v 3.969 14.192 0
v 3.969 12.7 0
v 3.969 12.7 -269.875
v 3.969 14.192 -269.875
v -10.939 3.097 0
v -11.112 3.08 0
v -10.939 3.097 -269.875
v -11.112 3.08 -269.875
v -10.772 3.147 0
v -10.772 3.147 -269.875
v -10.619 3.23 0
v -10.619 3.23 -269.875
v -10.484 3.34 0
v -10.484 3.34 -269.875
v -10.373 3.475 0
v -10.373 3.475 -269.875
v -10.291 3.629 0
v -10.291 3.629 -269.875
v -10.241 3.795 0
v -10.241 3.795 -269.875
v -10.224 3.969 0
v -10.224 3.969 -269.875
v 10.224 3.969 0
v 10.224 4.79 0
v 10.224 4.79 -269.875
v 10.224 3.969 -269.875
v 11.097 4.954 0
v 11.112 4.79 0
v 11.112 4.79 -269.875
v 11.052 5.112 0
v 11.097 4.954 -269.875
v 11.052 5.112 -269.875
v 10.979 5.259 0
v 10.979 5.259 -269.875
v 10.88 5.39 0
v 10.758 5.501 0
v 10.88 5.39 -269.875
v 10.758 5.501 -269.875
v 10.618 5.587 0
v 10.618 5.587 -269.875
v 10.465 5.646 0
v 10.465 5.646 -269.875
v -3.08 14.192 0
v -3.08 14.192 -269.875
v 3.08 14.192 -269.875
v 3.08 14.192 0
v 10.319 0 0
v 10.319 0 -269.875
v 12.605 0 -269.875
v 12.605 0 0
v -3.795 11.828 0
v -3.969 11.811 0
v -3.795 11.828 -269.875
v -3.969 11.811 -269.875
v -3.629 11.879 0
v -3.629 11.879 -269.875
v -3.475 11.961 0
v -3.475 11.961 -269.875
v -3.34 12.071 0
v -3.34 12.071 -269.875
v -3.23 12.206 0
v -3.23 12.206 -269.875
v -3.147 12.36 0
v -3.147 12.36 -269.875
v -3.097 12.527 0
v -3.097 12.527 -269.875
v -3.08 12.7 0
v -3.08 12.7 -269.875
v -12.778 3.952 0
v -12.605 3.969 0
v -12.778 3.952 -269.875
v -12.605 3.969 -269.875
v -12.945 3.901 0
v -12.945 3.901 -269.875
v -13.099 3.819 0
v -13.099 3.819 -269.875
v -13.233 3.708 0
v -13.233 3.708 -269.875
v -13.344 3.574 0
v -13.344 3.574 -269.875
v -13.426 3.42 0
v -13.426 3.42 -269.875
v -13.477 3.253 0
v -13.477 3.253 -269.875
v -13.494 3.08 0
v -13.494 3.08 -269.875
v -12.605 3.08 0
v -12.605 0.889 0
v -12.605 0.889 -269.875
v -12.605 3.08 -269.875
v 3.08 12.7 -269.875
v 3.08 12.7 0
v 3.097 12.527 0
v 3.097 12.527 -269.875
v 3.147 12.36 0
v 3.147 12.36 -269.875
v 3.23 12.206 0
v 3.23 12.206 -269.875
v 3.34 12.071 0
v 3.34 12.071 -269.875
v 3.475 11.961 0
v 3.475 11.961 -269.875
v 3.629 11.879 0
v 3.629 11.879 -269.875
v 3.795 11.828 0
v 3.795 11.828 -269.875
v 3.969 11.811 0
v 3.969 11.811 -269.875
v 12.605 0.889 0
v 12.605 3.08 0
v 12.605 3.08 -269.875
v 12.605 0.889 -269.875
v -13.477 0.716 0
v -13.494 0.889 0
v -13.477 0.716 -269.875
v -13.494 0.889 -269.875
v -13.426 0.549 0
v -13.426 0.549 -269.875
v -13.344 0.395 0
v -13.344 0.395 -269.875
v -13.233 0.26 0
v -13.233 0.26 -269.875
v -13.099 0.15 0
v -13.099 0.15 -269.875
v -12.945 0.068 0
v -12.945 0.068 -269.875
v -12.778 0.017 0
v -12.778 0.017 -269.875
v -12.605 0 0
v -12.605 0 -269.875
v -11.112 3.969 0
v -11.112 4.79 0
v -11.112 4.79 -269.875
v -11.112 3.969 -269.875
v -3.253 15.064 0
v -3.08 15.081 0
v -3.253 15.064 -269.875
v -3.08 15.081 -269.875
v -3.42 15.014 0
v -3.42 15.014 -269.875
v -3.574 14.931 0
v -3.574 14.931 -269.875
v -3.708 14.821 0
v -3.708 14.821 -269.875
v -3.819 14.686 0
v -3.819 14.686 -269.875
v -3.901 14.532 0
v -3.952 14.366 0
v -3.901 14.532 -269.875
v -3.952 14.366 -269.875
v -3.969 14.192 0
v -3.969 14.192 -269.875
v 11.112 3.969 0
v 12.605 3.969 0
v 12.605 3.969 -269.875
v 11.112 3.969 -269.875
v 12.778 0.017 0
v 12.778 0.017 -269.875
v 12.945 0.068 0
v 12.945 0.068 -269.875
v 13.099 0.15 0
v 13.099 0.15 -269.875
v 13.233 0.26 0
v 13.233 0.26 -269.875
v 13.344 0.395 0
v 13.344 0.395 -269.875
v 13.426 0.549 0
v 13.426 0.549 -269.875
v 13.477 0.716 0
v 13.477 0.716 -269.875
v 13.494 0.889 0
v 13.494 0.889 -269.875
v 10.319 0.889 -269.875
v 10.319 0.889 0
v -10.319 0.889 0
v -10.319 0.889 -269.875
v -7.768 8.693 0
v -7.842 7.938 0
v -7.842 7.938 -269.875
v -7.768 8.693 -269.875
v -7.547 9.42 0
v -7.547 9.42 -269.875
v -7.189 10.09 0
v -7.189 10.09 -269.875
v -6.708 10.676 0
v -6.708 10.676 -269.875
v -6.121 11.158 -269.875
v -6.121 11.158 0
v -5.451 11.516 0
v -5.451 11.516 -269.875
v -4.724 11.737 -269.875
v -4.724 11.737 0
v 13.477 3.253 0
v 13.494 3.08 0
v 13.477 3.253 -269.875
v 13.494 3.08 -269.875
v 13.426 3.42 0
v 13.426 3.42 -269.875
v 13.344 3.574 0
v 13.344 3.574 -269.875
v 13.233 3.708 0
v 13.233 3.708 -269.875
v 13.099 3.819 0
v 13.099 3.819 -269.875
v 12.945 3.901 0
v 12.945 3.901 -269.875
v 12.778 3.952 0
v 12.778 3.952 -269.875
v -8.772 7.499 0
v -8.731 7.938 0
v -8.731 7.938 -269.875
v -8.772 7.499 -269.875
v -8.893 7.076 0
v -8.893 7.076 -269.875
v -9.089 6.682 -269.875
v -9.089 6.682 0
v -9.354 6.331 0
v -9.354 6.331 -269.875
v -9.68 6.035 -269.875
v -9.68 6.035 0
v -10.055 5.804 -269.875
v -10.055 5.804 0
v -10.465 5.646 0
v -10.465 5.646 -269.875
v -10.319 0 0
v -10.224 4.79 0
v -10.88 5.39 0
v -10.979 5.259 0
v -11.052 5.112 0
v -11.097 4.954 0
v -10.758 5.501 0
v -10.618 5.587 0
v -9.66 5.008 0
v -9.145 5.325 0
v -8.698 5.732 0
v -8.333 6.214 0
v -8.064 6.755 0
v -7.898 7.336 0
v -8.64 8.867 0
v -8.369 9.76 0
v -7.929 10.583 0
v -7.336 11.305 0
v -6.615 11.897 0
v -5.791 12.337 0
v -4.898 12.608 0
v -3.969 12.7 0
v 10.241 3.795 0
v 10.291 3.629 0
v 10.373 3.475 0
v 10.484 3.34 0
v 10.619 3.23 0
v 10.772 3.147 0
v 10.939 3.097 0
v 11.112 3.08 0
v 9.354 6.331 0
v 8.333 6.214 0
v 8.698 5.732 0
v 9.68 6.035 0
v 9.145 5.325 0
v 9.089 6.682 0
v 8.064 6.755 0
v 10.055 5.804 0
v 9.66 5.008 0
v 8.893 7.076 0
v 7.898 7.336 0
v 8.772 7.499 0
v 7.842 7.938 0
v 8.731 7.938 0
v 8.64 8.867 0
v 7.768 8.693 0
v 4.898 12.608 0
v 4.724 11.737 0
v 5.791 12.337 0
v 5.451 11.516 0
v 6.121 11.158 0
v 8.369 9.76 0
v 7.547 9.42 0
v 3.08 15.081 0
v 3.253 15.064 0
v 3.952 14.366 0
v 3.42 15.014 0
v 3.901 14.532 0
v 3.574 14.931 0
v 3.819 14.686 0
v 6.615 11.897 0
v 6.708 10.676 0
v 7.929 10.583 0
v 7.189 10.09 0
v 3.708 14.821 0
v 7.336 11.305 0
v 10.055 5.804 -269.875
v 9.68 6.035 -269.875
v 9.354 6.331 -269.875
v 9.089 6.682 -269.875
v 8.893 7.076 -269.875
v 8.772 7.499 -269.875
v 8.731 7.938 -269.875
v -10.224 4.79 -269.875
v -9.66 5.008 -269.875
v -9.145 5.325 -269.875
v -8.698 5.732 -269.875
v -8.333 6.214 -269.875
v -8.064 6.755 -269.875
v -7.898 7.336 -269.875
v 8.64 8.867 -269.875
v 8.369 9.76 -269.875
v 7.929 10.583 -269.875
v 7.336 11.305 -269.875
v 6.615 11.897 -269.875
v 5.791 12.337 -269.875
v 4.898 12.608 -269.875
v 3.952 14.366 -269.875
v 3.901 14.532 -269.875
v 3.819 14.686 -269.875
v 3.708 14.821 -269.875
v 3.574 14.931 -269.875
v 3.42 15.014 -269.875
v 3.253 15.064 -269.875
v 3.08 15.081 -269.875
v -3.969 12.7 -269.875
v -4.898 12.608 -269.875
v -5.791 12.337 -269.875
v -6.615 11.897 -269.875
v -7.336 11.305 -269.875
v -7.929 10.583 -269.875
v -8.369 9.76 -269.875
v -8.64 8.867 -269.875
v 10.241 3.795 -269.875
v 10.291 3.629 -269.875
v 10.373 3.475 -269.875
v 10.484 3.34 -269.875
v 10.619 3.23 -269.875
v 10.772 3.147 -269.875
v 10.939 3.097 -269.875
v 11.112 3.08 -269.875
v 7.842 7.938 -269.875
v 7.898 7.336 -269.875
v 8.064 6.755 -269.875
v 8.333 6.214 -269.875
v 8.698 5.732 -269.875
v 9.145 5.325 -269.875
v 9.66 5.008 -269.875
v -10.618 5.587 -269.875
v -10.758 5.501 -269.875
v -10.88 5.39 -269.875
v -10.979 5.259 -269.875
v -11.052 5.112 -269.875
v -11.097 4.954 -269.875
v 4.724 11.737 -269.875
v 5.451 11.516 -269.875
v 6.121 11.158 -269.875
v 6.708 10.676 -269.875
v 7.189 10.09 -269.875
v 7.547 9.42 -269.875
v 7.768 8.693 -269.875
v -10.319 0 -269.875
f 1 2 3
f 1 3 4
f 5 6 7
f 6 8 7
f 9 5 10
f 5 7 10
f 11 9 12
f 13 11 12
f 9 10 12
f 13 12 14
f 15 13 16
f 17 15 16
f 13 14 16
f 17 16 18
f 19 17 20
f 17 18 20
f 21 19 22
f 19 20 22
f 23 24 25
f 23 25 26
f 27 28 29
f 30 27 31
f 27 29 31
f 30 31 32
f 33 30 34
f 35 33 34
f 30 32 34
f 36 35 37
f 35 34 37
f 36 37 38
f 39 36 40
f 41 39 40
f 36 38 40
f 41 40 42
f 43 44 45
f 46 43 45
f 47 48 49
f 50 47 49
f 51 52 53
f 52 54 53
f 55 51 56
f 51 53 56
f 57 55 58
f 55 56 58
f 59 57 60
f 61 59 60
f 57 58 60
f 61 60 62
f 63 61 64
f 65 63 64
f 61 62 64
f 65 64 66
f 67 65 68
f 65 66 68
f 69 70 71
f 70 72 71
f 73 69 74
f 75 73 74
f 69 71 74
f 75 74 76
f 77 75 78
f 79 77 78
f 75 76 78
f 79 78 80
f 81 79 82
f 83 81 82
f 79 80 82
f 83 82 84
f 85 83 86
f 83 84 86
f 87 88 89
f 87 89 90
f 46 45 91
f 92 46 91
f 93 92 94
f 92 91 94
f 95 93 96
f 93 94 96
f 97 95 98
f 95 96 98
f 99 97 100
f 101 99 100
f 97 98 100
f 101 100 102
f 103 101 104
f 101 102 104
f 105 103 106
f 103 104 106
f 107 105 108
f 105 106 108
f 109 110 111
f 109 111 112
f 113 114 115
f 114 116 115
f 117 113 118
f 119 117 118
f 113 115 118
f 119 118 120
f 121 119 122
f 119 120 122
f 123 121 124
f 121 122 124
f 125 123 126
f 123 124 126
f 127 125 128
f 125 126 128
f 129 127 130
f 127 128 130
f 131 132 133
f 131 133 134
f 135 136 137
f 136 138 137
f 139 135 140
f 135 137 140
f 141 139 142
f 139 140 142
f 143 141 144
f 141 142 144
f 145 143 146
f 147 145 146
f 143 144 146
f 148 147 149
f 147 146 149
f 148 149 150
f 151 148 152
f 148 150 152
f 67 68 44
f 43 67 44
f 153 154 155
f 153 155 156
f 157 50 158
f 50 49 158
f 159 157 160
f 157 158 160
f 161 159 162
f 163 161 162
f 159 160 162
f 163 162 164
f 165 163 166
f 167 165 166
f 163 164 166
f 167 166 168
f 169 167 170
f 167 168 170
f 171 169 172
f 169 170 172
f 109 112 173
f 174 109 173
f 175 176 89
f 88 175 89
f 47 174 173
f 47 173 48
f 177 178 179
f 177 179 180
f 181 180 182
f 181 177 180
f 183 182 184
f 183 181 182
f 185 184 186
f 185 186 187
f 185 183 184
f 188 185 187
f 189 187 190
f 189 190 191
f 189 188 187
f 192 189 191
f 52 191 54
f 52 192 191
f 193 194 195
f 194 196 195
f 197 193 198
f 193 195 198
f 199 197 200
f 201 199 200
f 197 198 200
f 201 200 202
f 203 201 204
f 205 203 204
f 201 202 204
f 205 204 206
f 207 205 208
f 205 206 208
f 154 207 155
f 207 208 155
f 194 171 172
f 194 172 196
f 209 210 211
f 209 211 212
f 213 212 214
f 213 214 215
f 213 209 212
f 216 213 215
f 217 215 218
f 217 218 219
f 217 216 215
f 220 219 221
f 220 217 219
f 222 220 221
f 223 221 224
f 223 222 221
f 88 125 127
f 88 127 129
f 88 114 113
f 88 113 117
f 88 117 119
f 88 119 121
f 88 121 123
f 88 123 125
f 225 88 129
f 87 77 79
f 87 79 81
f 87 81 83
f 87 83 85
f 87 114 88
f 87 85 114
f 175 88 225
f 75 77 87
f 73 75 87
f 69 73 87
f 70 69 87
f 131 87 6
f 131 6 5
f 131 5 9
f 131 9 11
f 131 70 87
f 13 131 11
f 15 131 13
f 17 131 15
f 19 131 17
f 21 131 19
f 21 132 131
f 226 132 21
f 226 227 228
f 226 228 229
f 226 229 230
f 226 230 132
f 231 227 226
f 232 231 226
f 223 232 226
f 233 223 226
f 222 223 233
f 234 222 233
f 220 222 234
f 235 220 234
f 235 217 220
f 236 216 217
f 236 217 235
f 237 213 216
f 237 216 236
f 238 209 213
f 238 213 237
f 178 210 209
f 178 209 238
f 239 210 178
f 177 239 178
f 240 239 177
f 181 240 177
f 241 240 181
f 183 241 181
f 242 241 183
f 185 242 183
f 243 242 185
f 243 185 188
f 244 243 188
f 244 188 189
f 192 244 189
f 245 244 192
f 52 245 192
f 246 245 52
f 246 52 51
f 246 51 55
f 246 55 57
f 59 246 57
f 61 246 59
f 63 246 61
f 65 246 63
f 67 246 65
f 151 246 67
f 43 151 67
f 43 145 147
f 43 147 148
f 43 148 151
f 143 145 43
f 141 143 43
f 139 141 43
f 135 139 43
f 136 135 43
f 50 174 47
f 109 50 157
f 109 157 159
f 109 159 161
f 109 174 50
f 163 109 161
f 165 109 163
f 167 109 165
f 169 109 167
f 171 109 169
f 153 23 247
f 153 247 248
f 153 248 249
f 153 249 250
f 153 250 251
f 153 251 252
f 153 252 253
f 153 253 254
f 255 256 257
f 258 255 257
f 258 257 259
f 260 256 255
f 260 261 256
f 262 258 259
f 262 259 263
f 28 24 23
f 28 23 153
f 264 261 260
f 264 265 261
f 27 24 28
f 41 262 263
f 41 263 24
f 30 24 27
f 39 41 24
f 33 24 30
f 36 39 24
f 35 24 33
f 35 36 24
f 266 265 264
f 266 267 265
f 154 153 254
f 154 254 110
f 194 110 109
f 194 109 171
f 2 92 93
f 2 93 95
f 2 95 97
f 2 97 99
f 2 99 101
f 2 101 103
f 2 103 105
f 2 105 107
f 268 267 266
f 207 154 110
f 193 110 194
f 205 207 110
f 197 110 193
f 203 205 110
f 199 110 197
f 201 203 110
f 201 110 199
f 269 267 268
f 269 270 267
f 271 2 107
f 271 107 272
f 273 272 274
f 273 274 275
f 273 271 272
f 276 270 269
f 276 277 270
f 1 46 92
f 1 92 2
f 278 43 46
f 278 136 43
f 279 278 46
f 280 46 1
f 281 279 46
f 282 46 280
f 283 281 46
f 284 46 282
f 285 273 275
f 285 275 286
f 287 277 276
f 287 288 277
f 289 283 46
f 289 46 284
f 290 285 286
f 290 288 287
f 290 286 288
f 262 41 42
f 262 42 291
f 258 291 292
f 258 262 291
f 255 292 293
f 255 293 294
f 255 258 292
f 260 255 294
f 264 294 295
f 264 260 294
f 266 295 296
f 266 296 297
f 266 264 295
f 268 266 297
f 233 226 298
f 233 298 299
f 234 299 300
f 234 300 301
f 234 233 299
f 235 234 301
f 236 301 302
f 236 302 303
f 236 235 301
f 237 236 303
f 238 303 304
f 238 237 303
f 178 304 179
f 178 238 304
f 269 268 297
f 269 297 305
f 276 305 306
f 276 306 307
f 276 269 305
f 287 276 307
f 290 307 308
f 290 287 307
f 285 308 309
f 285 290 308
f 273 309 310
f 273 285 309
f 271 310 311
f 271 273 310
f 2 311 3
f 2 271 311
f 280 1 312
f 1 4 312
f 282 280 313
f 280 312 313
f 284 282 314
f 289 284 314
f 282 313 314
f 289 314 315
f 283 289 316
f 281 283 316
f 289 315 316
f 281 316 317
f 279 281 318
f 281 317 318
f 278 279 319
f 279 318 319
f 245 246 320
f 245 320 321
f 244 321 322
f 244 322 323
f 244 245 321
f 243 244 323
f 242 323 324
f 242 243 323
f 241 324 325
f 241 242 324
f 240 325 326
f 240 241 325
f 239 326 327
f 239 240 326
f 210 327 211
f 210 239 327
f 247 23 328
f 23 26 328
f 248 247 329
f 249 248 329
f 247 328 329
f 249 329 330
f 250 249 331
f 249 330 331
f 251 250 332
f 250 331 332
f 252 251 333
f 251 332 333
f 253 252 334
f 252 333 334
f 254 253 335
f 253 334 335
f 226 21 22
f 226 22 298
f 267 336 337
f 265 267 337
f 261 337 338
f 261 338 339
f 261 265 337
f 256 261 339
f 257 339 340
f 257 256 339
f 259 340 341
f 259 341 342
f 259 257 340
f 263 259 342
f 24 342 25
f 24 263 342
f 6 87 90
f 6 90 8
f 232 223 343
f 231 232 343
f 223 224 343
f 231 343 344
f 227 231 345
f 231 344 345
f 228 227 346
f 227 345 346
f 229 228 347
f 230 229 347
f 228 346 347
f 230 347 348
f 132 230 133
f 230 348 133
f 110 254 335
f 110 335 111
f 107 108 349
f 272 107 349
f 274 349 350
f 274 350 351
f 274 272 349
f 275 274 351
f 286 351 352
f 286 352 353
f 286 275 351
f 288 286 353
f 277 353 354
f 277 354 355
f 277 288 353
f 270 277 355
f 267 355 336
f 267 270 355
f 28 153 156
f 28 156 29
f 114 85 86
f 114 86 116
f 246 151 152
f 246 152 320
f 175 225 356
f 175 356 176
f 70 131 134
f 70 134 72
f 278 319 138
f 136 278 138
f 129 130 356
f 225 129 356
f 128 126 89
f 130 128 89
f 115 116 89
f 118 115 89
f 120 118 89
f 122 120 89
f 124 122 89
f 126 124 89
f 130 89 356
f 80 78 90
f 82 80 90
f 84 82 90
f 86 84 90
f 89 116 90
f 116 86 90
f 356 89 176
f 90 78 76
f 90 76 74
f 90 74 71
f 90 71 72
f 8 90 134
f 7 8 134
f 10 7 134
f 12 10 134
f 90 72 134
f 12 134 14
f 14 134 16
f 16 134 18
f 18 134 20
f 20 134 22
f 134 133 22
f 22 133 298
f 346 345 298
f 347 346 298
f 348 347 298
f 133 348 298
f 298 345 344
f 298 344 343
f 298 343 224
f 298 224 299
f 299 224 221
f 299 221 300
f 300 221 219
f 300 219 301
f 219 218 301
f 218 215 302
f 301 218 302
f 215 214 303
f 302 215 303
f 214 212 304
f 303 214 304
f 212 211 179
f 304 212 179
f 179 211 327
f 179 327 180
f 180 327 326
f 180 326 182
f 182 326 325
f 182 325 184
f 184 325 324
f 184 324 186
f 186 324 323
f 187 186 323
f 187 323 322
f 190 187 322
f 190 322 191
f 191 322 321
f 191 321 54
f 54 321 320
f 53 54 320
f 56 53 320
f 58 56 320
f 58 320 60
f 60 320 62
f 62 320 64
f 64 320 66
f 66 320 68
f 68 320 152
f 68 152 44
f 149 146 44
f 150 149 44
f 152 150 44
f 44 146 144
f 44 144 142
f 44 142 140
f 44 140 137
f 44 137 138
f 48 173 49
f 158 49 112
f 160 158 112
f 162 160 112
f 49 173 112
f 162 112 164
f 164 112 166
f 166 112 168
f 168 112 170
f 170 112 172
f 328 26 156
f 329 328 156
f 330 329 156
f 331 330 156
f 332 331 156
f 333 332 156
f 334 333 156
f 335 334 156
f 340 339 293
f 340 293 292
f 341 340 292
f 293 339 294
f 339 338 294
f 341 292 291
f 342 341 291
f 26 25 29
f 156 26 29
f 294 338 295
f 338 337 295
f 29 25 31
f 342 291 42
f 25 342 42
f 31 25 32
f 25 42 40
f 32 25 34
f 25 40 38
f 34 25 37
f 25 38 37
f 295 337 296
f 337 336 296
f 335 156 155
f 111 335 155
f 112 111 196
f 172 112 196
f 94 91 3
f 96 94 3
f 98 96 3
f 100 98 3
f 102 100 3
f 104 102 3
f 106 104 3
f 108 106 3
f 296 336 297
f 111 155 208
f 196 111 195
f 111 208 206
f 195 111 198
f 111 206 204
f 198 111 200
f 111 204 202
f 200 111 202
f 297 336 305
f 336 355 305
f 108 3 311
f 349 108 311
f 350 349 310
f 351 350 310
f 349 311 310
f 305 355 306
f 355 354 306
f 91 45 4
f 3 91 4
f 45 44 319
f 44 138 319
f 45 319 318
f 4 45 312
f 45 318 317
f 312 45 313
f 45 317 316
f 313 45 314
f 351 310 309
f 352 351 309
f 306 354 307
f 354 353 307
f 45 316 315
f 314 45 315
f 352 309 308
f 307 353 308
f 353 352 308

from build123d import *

# Parameters (mm, degrees)
EXTRUDE_THIN1_DEPTH = 269.875
FILLET1_R           = 0.889


with BuildPart() as part:
    # Sketch1 → Extrude-Thin1 (new body)
    with BuildSketch(Plane.XY):
        with BuildLine():
            Line((10.31875, 0), (13.49375, 0))
            Line((13.49375, 0), (13.49375, 3.96875))
            Line((13.49375, 3.96875), (11.1125, 3.96875))
            Line((11.1125, 3.96875), (11.1125, 5.55625))
            ThreePointArc((11.1125, 5.55625), (9.428701977, 6.253701977), (8.73125, 7.9375))
            ThreePointArc((8.73125, 7.9375), (7.336346045, 11.305096045), (3.96875, 12.7))
            Line((3.96875, 12.7), (3.96875, 15.08125))
            Line((3.96875, 15.08125), (-3.96875, 15.08125))
            Line((-3.96875, 15.08125), (-3.96875, 12.7))
            ThreePointArc((-3.96875, 12.7), (-7.336346045, 11.305096045), (-8.73125, 7.9375))
            ThreePointArc((-8.73125, 7.9375), (-9.428701977, 6.253701977), (-11.1125, 5.55625))
            Line((-11.1125, 5.55625), (-11.1125, 3.96875))
            Line((-11.1125, 3.96875), (-13.49375, 3.96875))
            Line((-13.49375, 3.96875), (-13.49375, 0))
            Line((-13.49375, 0), (-10.31875, 0))
            Line((-10.31875, 0), (-10.31875, 0.889))
            Line((-10.31875, 0.889), (-12.60475, 0.889))
            Line((-12.60475, 0.889), (-12.60475, 3.07975))
            Line((-12.60475, 3.07975), (-10.2235, 3.07975))
            Line((-10.2235, 3.07975), (-10.2235, 4.790403868))
            ThreePointArc((-10.2235, 4.790403868), (-8.504647693, 5.96426879), (-7.84225, 7.9375))
            ThreePointArc((-7.84225, 7.9375), (-6.372960967, 10.974566327), (-3.07975, 11.707603613))
            Line((-3.07975, 11.707603613), (-3.07975, 14.19225))
            Line((-3.07975, 14.19225), (3.07975, 14.19225))
            Line((3.07975, 14.19225), (3.07975, 11.707603613))
            ThreePointArc((3.07975, 11.707603613), (6.372960967, 10.974566327), (7.84225, 7.9375))
            ThreePointArc((7.84225, 7.9375), (8.504647693, 5.96426879), (10.2235, 4.790403868))
            Line((10.2235, 4.790403868), (10.2235, 3.07975))
            Line((10.2235, 3.07975), (12.60475, 3.07975))
            Line((12.60475, 3.07975), (12.60475, 0.889))
            Line((12.60475, 0.889), (10.31875, 0.889))
            Line((10.31875, 0.889), (10.31875, 0))
        make_face()
    extrude(amount=-EXTRUDE_THIN1_DEPTH)

    # Fillet1
    fillet1_edges = [part.edges().sort_by_distance(p)[0] for p in [
        (-13.49375, 0, -134.9375),
        (-13.49375, 3.96875, -134.9375),
        (-11.1125, 5.55625, -134.9375),
        (-3.96875, 15.08125, -134.9375),
        (3.96875, 15.08125, -134.9375),
        (11.1125, 5.55625, -134.9375),
        (13.49375, 3.96875, -134.9375),
        (13.49375, 0, -134.9375),
        (10.2235, 3.07975, -134.9375),
        (3.07975, 11.707603613, -134.9375),
        (-3.07975, 11.707603613, -134.9375),
        (-10.2235, 3.07975, -134.9375),
    ]]
    fillet(fillet1_edges, radius=FILLET1_R)


solid = part.part
